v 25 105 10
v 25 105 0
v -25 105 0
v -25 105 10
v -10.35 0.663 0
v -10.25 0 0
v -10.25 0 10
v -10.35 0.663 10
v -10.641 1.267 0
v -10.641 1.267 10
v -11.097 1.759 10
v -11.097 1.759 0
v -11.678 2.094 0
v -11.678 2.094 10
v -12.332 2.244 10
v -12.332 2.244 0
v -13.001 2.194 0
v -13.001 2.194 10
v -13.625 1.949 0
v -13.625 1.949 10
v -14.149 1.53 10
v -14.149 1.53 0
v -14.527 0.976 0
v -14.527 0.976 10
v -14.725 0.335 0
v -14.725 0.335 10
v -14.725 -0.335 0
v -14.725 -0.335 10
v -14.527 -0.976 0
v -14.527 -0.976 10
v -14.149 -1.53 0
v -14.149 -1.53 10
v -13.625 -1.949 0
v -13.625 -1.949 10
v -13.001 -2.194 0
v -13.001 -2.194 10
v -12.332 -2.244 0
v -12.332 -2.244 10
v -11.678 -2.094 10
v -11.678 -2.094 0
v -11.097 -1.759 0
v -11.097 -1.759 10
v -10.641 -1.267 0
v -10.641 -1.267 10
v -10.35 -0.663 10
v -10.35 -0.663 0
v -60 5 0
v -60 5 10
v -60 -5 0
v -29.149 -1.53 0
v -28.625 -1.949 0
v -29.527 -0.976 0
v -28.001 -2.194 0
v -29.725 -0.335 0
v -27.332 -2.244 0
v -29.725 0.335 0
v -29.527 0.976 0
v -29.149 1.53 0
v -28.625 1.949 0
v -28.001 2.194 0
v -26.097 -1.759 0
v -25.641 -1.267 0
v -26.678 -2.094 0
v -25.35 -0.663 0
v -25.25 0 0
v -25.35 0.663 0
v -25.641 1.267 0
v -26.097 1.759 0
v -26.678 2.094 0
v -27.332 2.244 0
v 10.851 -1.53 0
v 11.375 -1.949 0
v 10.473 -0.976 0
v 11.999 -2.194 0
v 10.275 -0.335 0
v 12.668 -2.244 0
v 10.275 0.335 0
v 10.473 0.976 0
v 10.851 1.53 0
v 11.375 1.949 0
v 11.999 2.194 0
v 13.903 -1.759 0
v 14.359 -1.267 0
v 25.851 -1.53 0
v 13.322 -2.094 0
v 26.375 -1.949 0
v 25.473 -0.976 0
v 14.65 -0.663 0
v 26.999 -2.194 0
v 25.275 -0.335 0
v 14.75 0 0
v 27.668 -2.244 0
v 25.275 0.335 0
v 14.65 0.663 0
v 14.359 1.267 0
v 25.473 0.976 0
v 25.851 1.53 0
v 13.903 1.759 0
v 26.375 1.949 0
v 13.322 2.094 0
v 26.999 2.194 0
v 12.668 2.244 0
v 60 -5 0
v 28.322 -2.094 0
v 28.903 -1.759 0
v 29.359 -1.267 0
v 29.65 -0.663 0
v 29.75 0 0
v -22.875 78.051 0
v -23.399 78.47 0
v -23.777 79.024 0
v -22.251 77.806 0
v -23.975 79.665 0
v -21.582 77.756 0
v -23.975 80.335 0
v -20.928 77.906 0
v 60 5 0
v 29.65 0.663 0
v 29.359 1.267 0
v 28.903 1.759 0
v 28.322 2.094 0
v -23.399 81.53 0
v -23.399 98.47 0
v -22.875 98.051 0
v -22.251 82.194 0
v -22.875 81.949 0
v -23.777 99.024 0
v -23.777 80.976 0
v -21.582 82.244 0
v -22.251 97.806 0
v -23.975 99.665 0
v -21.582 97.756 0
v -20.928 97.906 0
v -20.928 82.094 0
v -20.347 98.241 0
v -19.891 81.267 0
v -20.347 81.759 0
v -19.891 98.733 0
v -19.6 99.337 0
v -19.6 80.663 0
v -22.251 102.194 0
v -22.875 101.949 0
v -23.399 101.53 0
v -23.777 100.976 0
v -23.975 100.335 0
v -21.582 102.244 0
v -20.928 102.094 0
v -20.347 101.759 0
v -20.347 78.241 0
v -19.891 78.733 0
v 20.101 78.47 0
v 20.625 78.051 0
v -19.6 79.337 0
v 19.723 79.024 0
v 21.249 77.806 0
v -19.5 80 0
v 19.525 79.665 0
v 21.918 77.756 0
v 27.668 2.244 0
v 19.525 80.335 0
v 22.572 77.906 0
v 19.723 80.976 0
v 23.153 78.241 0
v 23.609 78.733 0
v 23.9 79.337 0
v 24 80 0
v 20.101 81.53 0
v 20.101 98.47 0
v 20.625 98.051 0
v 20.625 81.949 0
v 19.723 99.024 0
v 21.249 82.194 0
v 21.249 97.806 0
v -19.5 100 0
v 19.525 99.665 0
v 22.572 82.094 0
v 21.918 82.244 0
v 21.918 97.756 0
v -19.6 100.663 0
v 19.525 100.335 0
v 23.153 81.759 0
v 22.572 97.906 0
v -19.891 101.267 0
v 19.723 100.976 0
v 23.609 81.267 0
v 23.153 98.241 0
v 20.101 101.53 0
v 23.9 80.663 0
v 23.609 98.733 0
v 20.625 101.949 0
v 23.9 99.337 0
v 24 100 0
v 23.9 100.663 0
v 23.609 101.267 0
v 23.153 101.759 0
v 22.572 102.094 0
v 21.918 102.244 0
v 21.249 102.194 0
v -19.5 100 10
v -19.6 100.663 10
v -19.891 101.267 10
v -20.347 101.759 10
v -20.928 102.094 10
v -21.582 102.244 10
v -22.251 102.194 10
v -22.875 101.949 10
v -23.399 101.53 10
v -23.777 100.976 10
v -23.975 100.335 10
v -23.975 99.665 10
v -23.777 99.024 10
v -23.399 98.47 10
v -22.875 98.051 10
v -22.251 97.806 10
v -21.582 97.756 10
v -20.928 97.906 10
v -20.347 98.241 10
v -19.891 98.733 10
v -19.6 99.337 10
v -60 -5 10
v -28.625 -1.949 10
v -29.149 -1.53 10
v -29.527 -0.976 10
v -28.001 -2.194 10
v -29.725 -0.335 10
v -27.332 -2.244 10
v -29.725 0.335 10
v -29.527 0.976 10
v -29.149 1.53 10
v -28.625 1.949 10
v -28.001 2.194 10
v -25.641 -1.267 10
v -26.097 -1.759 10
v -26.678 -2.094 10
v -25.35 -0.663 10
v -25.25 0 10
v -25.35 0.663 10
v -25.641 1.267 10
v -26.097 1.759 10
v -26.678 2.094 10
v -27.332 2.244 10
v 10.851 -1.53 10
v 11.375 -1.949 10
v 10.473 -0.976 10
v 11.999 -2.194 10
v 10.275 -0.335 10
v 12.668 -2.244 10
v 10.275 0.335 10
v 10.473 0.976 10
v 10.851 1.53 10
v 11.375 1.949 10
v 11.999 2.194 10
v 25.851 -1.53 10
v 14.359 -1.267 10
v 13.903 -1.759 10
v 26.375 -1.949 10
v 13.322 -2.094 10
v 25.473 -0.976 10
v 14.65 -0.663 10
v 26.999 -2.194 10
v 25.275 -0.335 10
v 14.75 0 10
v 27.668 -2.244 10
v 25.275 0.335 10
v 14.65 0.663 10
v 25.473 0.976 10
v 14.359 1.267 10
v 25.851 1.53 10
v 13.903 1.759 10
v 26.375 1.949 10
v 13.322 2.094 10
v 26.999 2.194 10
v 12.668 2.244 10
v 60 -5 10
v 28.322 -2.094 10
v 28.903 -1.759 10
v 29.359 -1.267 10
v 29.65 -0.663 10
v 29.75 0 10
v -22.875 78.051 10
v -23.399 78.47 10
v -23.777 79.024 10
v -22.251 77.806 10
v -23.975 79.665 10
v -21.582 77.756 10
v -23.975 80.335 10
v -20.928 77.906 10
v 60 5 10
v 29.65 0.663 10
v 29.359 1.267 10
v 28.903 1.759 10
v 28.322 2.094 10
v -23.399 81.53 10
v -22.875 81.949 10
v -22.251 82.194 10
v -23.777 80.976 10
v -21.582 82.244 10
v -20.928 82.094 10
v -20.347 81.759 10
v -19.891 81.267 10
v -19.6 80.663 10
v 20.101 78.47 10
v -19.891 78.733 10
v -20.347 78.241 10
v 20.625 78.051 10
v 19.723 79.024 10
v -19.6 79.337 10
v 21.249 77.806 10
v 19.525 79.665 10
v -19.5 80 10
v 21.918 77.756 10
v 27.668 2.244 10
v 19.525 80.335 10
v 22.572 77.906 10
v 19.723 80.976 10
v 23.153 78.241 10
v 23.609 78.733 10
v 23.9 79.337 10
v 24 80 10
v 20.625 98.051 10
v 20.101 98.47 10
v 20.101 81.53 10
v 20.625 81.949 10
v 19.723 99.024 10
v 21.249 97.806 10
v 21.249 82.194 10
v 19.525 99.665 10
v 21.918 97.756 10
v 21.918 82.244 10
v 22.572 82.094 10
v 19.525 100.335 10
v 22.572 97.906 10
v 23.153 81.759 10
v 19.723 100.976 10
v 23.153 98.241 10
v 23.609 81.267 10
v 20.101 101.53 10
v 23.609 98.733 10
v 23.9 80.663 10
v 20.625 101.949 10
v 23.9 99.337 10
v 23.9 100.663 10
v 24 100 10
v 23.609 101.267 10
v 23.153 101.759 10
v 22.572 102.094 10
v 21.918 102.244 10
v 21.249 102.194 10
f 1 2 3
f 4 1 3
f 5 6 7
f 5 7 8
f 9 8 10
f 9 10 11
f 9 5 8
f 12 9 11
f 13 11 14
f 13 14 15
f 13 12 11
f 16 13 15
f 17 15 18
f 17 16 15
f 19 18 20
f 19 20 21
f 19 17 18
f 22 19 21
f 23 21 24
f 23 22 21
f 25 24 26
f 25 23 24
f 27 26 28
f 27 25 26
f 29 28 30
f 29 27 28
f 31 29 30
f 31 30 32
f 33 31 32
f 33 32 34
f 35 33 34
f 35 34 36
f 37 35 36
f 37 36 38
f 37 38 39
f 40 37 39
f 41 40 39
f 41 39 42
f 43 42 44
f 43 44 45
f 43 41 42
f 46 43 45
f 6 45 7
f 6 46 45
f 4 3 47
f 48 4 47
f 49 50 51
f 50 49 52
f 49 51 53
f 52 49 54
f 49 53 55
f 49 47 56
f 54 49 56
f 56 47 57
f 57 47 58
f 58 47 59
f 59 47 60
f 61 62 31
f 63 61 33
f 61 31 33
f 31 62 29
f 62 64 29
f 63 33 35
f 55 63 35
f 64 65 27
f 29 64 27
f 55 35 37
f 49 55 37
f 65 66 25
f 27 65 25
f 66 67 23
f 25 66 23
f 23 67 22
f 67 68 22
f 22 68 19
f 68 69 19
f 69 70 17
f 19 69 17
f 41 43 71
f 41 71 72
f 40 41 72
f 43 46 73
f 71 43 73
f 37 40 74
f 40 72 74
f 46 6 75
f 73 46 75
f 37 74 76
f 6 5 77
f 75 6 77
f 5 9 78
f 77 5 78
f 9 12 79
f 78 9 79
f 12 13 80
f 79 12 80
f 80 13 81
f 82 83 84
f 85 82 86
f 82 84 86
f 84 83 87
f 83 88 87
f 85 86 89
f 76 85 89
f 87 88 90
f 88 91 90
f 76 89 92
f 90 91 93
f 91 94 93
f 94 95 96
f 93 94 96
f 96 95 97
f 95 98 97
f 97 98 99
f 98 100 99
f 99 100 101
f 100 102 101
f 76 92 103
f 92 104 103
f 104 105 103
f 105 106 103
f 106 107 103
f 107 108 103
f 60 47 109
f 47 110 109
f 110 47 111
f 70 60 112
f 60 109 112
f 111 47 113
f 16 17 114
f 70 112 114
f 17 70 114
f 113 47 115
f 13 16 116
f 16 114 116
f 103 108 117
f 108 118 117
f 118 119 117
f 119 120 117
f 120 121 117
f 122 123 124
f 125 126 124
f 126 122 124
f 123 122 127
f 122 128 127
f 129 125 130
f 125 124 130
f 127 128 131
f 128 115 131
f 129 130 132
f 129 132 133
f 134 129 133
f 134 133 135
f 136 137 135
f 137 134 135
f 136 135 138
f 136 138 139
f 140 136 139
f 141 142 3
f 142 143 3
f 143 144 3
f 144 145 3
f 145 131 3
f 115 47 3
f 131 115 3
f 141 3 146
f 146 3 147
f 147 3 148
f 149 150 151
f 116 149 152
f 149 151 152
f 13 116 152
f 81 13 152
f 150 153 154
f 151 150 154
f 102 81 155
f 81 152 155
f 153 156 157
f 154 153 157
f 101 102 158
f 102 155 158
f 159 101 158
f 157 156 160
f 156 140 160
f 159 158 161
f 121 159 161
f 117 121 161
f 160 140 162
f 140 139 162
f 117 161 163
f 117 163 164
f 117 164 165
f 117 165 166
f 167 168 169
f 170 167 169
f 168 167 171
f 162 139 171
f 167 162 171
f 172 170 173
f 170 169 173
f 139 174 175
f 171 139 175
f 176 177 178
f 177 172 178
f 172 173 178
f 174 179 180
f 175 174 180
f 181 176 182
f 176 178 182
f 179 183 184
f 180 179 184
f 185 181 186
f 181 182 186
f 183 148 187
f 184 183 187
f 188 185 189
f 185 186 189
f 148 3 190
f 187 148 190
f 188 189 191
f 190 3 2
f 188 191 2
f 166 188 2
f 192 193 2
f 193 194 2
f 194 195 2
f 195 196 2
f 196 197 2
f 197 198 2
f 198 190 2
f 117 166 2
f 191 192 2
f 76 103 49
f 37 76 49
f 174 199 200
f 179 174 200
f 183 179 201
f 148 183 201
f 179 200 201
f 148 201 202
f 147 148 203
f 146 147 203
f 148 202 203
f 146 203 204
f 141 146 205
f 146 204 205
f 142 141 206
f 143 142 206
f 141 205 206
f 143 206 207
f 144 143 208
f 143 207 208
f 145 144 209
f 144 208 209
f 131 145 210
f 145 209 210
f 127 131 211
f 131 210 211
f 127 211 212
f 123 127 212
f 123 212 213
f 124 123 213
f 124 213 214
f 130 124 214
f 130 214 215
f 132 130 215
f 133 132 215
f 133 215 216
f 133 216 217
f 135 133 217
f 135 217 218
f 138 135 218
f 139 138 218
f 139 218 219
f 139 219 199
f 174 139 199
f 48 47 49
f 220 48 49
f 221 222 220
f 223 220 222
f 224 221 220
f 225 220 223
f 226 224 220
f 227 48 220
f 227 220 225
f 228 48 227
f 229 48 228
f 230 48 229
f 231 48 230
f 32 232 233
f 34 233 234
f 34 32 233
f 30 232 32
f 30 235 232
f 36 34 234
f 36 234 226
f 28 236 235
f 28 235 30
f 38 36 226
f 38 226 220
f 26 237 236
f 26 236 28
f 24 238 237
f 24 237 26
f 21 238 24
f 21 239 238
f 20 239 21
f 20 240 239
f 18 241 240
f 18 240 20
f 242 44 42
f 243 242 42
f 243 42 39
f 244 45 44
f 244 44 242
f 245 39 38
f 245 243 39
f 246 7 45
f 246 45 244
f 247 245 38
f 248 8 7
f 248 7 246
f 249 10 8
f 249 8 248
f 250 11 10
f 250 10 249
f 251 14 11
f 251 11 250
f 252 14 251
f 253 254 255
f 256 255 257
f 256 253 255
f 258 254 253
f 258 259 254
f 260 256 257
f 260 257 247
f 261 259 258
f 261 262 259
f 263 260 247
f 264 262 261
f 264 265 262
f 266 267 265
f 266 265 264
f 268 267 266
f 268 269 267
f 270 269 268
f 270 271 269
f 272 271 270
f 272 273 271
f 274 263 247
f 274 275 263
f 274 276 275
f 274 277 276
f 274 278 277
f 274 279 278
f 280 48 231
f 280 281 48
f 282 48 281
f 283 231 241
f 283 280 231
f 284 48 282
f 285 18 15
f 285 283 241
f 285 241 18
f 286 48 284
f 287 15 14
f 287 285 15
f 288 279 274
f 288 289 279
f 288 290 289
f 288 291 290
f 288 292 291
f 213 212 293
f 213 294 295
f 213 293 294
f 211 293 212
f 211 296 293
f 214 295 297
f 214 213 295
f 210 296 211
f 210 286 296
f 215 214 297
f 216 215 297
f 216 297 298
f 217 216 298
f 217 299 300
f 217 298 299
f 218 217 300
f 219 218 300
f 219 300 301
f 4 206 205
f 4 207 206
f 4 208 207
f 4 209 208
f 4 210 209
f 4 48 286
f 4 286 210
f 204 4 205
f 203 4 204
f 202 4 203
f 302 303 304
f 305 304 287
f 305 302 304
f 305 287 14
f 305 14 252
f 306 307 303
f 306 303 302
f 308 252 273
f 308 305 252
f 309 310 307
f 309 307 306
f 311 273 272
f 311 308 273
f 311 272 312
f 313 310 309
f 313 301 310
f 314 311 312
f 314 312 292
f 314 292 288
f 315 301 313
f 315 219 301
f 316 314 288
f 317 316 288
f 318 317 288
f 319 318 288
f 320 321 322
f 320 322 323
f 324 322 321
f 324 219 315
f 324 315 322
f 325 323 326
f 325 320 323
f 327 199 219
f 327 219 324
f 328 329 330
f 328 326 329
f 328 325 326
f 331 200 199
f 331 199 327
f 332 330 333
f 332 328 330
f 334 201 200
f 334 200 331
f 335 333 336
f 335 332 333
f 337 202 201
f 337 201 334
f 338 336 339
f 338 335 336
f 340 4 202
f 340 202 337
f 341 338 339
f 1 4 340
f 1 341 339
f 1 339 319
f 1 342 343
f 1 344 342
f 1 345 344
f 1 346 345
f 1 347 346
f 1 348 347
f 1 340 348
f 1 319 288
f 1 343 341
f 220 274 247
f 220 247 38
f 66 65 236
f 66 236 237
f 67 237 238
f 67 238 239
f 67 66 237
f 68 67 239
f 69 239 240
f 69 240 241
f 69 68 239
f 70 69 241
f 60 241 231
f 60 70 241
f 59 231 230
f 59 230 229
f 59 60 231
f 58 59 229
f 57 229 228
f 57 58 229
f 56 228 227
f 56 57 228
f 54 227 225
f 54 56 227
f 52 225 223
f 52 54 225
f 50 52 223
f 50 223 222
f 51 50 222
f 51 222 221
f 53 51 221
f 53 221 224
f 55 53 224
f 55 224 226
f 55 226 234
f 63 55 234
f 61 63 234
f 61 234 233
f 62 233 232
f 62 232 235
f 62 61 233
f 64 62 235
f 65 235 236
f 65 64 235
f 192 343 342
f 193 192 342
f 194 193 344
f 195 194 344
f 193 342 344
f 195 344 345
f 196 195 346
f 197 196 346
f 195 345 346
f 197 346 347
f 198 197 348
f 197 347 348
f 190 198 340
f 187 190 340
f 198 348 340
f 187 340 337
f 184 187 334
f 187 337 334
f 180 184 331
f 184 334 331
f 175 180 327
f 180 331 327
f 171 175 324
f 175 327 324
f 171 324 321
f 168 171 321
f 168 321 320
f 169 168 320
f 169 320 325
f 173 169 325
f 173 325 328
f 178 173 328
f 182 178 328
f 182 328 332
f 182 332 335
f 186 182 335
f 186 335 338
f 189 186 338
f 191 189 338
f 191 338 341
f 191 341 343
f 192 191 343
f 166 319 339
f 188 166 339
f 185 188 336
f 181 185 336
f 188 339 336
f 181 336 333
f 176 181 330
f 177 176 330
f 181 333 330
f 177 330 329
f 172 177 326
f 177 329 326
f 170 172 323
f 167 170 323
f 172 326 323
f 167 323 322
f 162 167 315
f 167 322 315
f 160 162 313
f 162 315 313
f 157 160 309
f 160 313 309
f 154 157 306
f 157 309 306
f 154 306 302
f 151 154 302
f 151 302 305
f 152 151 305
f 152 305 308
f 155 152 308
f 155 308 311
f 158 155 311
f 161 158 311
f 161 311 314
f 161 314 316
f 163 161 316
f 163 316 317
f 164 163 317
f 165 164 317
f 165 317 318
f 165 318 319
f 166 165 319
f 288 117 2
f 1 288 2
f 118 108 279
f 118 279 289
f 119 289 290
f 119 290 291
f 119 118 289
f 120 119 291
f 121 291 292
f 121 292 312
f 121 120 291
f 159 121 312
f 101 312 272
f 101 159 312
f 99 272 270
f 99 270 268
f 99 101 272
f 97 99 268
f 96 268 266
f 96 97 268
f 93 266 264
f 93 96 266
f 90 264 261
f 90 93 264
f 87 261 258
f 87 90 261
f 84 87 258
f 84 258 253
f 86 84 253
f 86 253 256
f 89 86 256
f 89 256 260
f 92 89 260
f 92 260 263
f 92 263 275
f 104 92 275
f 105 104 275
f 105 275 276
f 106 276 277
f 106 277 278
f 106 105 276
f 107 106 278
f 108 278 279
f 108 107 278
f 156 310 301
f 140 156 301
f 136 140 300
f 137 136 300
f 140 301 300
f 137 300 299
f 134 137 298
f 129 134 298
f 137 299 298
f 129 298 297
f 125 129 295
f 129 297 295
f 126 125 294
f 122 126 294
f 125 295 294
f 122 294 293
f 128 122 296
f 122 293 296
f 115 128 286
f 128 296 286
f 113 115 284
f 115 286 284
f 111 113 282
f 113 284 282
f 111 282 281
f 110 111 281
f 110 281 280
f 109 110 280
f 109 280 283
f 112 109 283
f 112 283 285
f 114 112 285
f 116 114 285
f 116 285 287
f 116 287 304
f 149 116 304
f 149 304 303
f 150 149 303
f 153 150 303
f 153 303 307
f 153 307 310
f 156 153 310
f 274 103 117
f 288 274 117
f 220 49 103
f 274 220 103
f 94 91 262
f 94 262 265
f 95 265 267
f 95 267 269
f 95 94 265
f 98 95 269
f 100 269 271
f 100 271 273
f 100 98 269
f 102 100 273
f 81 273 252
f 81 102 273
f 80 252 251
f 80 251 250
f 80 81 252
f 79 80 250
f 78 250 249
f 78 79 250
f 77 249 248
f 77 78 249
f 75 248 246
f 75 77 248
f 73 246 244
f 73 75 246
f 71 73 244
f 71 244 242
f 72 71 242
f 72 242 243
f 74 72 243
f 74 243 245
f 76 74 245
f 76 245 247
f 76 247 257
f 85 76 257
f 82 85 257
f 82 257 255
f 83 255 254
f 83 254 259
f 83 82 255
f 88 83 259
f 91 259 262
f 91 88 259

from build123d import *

# Parameters (mm, degrees)
SKETCH1_R           = 2.25
BOSS_EXTRUDE1_DEPTH = 10
SKETCH2_R           = 2.25
CUT_EXTRUDE1_DEPTH  = 11


with BuildPart() as part:
    # Sketch1 → Boss-Extrude1 (new body)
    with BuildSketch(Plane.XY):
        Polygon((-60, -5), (60, -5), (60, 5), (25, 105), (-25, 105), (-60, 5), align=None)
        with Locations((27.5, 0)):
            Circle(SKETCH1_R, mode=Mode.SUBTRACT)
        with Locations((12.5, 0)):
            Circle(SKETCH1_R, mode=Mode.SUBTRACT)
        with Locations((-12.5, 0)):
            Circle(SKETCH1_R, mode=Mode.SUBTRACT)
        with Locations((-27.5, 0)):
            Circle(SKETCH1_R, mode=Mode.SUBTRACT)
    extrude(amount=BOSS_EXTRUDE1_DEPTH)

    # Sketch2 → Cut-Extrude1 (cut, through all)
    with BuildSketch(Plane.XY.offset(10)):
        with Locations((-21.75, 80)):
            Circle(SKETCH2_R)
        with Locations((21.75, 80)):
            Circle(SKETCH2_R)
        with Locations((21.75, 100)):
            Circle(SKETCH2_R)
        with Locations((-21.75, 100)):
            Circle(SKETCH2_R)
    extrude(amount=-CUT_EXTRUDE1_DEPTH, mode=Mode.SUBTRACT)


solid = part.part
